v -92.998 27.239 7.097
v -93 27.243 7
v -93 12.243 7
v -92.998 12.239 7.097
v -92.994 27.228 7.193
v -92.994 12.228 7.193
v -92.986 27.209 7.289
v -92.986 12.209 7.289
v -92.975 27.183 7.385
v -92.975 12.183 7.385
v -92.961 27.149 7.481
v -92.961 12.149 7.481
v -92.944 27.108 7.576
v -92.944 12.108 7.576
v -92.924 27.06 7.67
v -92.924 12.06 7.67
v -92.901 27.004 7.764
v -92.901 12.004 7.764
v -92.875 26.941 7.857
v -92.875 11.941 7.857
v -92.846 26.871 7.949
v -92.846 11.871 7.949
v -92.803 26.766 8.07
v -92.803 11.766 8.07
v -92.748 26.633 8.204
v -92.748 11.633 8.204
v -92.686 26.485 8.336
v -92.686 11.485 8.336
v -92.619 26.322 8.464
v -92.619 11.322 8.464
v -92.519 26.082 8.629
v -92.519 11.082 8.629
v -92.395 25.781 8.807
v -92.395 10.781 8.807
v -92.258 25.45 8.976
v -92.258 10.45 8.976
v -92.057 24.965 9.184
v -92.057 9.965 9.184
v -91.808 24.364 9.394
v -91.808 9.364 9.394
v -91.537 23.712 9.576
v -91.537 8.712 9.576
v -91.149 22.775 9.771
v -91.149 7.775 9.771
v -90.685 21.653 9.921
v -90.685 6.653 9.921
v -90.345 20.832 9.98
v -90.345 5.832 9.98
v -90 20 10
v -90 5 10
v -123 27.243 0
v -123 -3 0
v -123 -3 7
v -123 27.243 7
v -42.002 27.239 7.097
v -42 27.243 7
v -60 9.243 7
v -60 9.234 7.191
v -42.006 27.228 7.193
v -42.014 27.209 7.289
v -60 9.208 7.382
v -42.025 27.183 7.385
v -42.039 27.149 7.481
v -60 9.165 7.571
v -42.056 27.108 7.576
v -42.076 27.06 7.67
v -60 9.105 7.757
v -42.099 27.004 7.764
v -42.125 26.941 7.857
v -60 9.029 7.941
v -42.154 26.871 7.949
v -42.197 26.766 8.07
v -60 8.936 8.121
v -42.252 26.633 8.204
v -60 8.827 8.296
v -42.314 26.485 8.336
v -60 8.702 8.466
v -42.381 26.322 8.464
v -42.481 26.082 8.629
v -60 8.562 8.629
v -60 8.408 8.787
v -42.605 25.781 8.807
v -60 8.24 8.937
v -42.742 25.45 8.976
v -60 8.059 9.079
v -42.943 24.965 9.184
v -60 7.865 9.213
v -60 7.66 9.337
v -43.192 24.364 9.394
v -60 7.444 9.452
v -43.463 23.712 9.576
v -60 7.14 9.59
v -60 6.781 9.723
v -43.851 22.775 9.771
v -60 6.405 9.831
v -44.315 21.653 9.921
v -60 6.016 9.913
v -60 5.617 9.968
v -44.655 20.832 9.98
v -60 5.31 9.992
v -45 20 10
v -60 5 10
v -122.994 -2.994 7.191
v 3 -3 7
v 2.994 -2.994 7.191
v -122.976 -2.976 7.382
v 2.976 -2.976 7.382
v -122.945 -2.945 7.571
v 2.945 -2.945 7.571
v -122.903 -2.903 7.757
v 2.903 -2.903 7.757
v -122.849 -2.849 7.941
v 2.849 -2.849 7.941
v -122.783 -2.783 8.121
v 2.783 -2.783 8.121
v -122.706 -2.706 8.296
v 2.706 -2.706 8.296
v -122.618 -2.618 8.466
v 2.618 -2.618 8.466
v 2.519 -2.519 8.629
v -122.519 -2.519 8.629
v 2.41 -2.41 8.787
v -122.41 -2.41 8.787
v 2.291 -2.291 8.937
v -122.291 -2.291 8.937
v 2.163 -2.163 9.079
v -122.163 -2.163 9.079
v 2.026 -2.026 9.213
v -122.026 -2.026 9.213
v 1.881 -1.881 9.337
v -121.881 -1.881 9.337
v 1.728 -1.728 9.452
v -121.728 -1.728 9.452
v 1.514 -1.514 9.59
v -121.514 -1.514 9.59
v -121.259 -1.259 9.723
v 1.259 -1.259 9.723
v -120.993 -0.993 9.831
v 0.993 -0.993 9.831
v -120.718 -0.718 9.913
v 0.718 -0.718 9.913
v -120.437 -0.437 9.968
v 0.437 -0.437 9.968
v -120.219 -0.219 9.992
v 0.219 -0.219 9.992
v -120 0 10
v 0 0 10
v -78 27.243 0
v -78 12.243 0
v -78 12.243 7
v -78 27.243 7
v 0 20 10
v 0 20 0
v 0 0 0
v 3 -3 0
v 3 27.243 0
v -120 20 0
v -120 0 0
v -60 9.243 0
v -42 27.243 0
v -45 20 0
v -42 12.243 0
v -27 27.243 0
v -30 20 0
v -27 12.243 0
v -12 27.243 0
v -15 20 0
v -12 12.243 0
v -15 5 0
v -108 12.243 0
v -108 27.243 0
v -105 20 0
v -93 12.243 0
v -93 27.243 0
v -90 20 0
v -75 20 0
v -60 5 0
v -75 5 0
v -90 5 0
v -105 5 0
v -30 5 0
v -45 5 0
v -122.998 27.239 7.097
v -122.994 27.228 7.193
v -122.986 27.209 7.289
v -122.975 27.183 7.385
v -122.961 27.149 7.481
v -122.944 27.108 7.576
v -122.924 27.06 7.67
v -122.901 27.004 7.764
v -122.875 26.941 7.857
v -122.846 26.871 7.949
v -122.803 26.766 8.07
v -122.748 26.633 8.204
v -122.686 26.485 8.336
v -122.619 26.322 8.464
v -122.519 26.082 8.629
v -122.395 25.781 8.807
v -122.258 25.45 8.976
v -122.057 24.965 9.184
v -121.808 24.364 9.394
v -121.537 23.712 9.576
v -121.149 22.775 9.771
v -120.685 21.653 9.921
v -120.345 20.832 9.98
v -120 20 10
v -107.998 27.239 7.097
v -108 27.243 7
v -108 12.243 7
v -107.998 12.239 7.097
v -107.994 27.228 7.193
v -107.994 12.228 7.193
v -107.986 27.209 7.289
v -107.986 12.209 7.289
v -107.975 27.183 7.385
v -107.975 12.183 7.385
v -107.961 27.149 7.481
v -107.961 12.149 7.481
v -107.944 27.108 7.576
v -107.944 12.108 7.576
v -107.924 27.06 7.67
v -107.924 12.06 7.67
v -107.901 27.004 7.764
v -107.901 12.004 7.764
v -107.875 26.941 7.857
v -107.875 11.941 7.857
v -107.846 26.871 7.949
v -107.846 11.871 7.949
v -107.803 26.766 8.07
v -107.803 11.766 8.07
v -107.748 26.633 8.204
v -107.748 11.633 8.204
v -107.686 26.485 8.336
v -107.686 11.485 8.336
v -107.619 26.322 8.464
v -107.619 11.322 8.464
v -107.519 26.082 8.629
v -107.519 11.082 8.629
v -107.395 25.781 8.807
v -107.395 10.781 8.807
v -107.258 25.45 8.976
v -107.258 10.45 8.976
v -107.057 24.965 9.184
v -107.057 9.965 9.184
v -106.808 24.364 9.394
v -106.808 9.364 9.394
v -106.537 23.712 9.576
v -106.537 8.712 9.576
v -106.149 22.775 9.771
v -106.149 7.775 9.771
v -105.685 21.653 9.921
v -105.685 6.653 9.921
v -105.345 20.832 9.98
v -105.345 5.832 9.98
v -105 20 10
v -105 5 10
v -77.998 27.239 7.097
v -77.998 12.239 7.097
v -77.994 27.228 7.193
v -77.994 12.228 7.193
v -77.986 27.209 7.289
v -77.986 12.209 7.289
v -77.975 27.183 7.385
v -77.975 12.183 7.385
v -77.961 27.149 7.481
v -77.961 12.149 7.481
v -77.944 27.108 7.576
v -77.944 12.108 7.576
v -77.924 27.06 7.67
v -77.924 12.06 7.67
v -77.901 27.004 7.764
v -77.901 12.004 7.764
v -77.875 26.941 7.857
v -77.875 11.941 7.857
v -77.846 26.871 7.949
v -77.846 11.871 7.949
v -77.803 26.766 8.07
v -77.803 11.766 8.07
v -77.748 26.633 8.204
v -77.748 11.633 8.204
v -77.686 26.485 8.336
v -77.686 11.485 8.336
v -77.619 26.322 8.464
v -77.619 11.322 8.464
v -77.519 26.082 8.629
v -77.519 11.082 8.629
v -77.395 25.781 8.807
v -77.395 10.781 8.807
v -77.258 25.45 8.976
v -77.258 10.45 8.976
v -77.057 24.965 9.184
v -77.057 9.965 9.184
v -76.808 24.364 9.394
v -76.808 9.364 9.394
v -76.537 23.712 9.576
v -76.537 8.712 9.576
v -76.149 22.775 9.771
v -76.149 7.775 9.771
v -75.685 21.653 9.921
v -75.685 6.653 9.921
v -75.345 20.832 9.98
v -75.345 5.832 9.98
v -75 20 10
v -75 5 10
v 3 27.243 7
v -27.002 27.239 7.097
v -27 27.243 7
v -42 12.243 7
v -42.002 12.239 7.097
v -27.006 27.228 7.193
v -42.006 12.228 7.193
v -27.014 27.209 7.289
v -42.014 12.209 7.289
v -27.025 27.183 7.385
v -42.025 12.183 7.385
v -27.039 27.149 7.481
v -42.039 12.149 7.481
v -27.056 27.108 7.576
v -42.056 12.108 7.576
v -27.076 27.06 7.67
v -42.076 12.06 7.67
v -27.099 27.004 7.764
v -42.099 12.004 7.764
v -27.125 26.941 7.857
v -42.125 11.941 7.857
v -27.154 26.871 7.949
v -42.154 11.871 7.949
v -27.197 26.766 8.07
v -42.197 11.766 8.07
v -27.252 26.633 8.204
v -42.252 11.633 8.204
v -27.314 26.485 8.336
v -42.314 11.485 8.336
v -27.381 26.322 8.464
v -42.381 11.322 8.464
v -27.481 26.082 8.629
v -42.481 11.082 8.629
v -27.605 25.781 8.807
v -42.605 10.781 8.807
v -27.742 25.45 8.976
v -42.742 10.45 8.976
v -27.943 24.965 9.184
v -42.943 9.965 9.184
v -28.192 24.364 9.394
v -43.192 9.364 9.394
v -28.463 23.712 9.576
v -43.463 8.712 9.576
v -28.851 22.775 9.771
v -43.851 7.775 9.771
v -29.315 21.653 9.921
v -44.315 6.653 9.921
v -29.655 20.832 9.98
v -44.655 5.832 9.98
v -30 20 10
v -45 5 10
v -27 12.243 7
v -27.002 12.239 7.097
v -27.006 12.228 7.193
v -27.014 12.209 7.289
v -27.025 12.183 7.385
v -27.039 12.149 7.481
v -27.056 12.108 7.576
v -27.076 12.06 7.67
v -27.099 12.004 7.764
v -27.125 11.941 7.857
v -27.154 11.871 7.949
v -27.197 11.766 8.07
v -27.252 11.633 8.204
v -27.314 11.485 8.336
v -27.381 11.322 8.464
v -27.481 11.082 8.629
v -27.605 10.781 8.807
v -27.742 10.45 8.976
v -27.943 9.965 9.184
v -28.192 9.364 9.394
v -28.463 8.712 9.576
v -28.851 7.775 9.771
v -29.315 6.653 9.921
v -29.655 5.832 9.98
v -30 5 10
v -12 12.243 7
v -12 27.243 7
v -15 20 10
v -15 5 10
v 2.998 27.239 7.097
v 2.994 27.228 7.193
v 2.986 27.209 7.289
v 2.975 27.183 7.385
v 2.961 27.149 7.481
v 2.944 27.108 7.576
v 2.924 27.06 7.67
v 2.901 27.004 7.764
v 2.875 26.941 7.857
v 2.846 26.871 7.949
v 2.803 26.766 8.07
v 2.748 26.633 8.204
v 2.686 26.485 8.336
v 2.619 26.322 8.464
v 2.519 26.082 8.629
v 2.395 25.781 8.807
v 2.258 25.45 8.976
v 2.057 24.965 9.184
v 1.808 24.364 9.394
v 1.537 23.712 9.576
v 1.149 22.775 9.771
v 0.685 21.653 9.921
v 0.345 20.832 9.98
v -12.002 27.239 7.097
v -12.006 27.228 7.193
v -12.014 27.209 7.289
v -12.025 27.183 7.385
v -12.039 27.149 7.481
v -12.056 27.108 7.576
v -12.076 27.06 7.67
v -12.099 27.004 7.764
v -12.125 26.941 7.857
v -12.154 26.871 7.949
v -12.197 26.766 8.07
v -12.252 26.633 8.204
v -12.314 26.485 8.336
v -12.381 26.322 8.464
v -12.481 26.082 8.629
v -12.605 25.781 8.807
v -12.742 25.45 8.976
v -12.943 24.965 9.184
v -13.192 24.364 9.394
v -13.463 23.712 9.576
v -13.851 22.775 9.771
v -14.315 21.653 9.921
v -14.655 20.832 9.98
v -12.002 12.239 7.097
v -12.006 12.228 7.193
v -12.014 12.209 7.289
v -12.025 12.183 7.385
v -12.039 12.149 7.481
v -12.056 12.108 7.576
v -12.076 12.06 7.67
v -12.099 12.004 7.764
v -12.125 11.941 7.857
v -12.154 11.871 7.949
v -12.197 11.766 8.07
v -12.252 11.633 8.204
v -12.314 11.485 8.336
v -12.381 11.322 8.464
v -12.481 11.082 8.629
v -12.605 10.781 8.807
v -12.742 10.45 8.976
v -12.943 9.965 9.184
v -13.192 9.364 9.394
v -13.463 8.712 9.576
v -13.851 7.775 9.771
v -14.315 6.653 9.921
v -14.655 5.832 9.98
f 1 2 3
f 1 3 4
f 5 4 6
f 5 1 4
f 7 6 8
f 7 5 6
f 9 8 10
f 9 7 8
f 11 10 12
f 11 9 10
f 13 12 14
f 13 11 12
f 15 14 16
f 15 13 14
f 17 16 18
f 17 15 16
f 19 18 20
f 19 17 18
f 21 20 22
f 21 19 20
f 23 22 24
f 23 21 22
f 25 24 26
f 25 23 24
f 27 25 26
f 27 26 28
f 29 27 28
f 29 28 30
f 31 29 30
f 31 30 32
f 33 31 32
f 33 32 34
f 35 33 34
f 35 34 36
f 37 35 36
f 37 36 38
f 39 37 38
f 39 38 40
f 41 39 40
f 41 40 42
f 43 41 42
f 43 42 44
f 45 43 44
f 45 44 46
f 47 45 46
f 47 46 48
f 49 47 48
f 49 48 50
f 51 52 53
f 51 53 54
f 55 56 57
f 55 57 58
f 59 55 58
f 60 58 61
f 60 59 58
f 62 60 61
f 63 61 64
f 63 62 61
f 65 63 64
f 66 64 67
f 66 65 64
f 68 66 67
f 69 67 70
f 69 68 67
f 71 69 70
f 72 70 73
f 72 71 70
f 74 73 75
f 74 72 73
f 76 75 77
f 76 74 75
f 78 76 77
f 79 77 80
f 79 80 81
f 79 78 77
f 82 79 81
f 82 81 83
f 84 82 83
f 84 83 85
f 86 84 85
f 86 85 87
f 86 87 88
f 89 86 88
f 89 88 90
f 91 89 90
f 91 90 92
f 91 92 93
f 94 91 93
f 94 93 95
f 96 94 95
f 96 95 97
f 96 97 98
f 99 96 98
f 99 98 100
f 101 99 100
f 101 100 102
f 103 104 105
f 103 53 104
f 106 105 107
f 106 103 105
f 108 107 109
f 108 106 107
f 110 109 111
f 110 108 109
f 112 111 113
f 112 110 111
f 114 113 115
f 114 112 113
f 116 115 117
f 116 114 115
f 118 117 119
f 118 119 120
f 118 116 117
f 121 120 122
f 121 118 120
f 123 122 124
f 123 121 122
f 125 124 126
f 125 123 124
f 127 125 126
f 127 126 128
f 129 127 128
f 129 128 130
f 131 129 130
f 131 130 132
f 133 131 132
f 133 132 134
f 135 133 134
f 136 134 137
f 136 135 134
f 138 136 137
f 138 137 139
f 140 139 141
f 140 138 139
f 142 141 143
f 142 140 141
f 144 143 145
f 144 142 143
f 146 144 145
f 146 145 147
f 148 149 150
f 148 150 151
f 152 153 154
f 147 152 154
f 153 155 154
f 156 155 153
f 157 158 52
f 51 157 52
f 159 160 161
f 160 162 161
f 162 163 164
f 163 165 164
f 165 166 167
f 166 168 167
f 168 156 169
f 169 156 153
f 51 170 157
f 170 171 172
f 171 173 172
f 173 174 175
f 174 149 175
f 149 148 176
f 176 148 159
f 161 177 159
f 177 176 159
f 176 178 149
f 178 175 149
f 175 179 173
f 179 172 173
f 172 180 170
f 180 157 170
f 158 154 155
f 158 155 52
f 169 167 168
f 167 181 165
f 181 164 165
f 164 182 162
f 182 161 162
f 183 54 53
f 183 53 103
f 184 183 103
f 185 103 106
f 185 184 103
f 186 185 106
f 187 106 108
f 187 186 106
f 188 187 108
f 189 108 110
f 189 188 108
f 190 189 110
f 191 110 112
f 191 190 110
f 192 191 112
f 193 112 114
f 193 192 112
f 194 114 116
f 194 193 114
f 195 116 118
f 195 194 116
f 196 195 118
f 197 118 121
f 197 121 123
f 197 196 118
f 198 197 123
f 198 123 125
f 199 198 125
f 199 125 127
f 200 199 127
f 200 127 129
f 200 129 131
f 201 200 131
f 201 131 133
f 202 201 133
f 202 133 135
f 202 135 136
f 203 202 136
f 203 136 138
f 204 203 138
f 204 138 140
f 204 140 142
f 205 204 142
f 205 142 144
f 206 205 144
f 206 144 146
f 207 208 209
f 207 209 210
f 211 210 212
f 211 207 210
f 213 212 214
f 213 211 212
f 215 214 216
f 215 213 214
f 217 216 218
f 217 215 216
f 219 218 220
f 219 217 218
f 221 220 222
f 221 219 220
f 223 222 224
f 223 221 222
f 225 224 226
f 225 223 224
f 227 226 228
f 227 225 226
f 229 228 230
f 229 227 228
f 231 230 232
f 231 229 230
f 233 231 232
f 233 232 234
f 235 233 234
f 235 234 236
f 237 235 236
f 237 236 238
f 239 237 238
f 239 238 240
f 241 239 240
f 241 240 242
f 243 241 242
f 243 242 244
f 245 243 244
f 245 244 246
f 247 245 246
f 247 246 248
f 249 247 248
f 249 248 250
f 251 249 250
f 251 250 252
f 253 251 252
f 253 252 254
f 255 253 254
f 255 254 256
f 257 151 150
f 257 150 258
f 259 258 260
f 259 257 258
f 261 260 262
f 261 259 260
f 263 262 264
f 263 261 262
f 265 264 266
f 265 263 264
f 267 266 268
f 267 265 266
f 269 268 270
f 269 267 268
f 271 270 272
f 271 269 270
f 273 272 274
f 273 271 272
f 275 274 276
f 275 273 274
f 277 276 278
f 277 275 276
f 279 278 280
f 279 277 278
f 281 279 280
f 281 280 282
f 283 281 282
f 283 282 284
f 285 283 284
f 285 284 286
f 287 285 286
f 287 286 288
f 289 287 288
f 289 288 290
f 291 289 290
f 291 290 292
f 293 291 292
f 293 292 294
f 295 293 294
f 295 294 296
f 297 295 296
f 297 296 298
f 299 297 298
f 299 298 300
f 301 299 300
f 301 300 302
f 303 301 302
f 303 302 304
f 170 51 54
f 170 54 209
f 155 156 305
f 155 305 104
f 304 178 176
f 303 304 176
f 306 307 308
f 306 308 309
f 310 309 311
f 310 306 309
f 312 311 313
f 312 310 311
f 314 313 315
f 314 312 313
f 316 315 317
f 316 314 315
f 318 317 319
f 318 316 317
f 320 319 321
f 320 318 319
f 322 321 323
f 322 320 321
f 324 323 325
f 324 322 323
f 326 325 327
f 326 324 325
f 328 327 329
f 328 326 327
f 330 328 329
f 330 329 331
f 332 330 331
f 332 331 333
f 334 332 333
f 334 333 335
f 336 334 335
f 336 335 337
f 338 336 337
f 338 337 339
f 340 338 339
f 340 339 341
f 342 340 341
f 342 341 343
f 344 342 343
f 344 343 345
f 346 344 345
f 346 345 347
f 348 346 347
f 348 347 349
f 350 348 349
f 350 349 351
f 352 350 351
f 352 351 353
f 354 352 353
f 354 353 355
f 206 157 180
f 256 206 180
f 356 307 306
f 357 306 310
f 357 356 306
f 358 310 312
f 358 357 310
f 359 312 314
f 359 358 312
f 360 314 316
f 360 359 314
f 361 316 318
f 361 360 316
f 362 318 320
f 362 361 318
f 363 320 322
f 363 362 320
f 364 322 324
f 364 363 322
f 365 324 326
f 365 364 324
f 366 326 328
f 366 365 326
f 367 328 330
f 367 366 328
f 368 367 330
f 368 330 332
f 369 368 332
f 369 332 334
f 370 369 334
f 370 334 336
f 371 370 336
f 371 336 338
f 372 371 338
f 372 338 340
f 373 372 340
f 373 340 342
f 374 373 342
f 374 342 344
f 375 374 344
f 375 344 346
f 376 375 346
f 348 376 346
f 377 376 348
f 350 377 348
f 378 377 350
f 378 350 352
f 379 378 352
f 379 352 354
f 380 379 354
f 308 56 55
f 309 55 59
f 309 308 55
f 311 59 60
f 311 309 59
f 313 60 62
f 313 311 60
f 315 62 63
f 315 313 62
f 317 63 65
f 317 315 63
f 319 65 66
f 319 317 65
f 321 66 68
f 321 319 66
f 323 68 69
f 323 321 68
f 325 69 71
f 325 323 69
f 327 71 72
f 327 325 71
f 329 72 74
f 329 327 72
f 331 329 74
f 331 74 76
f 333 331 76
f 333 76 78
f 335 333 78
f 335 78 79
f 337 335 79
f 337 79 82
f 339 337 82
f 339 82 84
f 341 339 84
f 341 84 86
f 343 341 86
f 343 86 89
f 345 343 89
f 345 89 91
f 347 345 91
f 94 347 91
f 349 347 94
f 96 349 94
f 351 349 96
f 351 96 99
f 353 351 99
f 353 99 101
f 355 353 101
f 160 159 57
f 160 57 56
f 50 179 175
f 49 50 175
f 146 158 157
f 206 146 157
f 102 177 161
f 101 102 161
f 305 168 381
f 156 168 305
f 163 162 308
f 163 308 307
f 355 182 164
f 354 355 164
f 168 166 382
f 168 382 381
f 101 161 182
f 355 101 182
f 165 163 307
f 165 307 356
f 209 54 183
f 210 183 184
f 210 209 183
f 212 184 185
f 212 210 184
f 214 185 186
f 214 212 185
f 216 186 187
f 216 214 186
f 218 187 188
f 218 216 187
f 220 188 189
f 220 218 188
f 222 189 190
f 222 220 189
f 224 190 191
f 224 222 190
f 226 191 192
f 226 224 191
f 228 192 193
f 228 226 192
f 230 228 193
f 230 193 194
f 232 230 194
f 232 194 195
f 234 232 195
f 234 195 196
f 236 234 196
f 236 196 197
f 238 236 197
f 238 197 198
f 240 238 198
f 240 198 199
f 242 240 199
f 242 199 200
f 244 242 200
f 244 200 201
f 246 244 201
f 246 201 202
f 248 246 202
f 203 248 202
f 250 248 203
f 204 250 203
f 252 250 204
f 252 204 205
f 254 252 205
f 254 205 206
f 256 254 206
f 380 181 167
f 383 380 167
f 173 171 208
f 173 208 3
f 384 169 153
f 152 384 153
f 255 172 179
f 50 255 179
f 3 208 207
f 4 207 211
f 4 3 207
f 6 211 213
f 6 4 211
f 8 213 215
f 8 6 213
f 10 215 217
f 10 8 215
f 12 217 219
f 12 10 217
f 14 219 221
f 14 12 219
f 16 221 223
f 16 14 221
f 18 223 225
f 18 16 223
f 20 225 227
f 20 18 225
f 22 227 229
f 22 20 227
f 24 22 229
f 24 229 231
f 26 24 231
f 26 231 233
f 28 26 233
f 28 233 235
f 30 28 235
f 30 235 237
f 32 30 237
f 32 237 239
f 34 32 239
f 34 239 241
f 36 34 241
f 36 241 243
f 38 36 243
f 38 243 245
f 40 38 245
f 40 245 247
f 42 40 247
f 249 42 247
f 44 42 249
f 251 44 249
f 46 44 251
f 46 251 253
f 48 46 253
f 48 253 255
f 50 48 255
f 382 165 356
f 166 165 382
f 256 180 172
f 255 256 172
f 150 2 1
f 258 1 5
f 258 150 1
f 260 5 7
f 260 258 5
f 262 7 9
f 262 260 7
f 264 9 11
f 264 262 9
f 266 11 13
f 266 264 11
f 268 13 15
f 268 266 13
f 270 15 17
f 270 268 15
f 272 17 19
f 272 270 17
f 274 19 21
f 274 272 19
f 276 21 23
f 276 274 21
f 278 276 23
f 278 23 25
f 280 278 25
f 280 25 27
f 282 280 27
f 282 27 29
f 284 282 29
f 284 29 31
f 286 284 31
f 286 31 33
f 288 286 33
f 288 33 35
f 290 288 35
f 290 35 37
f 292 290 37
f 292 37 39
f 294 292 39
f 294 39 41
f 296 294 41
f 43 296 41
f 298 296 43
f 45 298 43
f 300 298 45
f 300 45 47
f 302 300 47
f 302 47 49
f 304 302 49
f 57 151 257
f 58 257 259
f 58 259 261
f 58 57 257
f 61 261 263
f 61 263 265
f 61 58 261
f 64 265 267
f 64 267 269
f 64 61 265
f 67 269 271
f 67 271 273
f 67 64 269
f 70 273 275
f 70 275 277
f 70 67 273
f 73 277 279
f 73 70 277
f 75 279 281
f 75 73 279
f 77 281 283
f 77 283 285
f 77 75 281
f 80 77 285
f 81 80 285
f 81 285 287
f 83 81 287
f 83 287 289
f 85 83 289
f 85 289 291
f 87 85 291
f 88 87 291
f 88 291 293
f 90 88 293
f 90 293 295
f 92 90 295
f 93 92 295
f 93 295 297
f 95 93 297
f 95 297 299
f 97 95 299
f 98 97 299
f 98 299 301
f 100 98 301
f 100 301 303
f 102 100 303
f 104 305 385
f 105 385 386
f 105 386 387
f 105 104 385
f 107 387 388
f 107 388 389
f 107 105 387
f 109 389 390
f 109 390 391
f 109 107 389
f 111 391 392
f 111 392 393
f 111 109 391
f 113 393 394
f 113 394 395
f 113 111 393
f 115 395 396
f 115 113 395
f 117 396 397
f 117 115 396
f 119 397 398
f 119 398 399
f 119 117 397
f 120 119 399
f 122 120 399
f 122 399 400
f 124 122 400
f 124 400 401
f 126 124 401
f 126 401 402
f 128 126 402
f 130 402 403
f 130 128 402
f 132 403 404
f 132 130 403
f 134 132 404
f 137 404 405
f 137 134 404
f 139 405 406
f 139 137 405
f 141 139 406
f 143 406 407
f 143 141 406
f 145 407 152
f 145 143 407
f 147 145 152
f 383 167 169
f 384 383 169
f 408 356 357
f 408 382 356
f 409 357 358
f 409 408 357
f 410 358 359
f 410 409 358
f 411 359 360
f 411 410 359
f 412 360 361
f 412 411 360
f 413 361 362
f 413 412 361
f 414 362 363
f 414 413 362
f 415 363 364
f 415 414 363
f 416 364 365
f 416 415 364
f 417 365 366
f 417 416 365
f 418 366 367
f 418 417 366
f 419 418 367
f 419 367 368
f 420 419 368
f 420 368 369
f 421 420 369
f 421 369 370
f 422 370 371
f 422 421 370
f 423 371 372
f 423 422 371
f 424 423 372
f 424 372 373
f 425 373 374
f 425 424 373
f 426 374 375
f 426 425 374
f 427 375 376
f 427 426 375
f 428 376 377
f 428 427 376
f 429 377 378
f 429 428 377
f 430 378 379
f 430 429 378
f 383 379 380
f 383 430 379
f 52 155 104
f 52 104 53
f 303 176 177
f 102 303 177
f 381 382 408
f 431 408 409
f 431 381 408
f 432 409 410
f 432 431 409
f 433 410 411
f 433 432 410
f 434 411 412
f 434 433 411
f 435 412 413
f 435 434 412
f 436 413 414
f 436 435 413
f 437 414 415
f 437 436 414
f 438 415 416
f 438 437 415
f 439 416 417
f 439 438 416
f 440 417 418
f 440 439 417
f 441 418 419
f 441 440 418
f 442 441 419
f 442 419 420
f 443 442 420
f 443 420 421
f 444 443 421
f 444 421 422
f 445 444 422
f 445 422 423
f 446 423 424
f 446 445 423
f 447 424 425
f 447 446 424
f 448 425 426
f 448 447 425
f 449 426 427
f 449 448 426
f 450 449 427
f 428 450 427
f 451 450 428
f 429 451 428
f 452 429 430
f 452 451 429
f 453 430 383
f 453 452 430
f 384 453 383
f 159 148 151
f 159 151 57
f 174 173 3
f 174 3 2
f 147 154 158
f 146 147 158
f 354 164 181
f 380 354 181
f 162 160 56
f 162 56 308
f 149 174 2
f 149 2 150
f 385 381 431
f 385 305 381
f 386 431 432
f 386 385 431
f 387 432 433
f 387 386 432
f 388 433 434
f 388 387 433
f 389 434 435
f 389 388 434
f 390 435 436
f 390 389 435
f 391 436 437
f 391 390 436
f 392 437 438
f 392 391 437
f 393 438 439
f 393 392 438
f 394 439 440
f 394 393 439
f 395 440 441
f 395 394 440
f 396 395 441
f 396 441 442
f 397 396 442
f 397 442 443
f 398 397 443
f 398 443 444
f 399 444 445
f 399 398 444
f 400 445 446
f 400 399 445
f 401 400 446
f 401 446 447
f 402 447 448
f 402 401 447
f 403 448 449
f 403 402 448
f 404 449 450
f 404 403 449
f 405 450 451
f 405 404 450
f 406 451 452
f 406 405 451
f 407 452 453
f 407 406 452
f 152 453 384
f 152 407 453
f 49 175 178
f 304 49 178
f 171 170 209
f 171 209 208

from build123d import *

# Parameters (mm, degrees)
BOSS_EXTRUDE1_DEPTH = 10
FILLET11_R          = 3


with BuildPart() as part:
    # Sketch2 → Boss-Extrude1 (new body)
    with BuildSketch(Plane.XY):
        Polygon((-60, 9.242640687), (-42, 27.242640687), (-42, 12.242640687), (-27, 27.242640687), (-27, 12.242640687), (-12, 27.242640687), (-12, 12.242640687), (3, 27.242640687), (3, -3), (-123, -3), (-123, 27.242640687), (-108, 12.242640687), (-108, 27.242640687), (-93, 12.242640687), (-93, 27.242640687), (-78, 12.242640687), (-78, 27.242640687), align=None)
        Polygon((-60, 5), (-45, 20), (-45, 5), (-30, 20), (-30, 5), (-15, 20), (-15, 5), (0, 20), (0, 0), (-120, 0), (-120, 20), (-105, 5), (-105, 20), (-90, 5), (-90, 20), (-75, 5), (-75, 20), align=None, mode=Mode.SUBTRACT)
    extrude(amount=BOSS_EXTRUDE1_DEPTH)

    # Fillet11
    fillet11_edges = [part.edges().sort_by_distance(p)[0] for p in [
        (-85.5, 19.742640687, 10),
        (-93, 19.742640687, 10),
        (-100.5, 19.742640687, 10),
        (-108, 19.742640687, 10),
        (-115.5, 19.742640687, 10),
        (-123, 12.121320344, 10),
        (-60, -3, 10),
        (3, 12.121320344, 10),
        (-4.5, 19.742640687, 10),
        (-12, 19.742640687, 10),
        (-69, 18.242640687, 10),
        (-19.5, 19.742640687, 10),
        (-27, 19.742640687, 10),
        (-34.5, 19.742640687, 10),
        (-42, 19.742640687, 10),
        (-51, 18.242640687, 10),
        (-78, 19.742640687, 10),
    ]]
    fillet(fillet11_edges, radius=FILLET11_R - 0.0001)  # a hair under: the kernel refuses the full size


solid = part.part
